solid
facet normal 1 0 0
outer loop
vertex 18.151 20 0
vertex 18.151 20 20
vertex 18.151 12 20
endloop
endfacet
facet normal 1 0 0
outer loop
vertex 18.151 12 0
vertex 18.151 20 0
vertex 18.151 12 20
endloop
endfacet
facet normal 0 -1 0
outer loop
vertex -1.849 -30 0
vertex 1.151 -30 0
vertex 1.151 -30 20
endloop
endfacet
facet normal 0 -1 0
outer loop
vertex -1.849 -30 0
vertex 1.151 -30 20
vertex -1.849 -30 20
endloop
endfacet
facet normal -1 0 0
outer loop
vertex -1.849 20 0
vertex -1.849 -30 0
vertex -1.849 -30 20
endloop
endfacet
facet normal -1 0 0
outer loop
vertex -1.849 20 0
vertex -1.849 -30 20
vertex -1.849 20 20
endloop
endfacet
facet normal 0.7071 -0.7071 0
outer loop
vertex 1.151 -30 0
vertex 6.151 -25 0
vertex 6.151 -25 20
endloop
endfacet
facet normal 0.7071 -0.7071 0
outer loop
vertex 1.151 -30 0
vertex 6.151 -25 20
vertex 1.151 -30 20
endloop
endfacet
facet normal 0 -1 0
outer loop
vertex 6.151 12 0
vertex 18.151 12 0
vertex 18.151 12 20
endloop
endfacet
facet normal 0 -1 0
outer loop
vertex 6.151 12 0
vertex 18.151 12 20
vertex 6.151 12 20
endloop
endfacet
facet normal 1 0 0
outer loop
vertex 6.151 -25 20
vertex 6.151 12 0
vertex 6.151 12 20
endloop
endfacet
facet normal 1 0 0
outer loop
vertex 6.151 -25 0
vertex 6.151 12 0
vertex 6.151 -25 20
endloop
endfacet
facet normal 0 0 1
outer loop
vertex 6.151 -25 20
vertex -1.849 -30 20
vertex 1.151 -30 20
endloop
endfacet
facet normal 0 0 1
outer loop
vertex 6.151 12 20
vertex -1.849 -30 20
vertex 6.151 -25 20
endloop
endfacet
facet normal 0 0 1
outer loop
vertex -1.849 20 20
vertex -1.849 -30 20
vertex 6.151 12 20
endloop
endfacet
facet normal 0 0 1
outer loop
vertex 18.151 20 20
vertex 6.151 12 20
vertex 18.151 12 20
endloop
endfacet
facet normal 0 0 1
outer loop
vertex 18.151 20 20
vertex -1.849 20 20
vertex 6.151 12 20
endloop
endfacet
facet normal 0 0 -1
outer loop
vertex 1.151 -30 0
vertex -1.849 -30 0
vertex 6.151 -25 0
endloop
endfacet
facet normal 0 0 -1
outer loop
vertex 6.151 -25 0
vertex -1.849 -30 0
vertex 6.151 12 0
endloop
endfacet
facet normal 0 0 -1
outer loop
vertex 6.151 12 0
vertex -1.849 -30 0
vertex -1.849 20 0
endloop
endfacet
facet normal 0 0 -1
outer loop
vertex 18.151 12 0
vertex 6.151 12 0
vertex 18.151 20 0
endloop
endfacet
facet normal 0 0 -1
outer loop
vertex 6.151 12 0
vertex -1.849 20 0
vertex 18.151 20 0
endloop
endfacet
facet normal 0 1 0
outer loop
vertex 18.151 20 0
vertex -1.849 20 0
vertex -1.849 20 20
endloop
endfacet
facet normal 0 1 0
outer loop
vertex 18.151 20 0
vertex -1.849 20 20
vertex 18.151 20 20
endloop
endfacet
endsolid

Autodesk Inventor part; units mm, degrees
ref_plane "YZ Plane" through (0, 0, 0) normal (1, 0, 0) x (0, 1, 0)
ref_plane "XZ Plane" through (0, 0, 0) normal (0, 1, 0) x (-1, 0, 0)
ref_plane "XY Plane" through (0, 0, 0) normal (0, 0, 1) x (1, 0, 0)
sketch "ｽｹｯﾁ1" plane through (0, 0, 0) normal (0, 0, 1) x (1, 0, 0)
  line L0 (-1.8494, 20) -> (18.1506, 20)
  line L1 (18.1506, 20) -> (18.1506, 12)
  line L2 (18.1506, 12) -> (-1.8494, 12)
  line L3 (-1.8494, 12) -> (-1.8494, 20)
  line L4 (-1.8494, 20) -> (6.1506, 20)
  line L5 (6.1506, 20) -> (6.1506, -25)
  line L6 (1.1506, -30) -> (-1.8494, -30)
  line L7 (-1.8494, -30) -> (-1.8494, 20)
  line L8 (6.1506, -25) -> (1.1506, -30)
  point P0 (6.1506, -30)
  dimension "d0" = 20
  dimension "d1" = 8
  dimension "d2" = 50
  dimension "d3" = 5
  dimension "d4" = 5
  dimension "d5" = 8
extrude "Extrusion1" add sketch "ｽｹｯﾁ1" along normal blind 20
equation "\"d4\" = d3"
properties part number "Robot-Clamp"
